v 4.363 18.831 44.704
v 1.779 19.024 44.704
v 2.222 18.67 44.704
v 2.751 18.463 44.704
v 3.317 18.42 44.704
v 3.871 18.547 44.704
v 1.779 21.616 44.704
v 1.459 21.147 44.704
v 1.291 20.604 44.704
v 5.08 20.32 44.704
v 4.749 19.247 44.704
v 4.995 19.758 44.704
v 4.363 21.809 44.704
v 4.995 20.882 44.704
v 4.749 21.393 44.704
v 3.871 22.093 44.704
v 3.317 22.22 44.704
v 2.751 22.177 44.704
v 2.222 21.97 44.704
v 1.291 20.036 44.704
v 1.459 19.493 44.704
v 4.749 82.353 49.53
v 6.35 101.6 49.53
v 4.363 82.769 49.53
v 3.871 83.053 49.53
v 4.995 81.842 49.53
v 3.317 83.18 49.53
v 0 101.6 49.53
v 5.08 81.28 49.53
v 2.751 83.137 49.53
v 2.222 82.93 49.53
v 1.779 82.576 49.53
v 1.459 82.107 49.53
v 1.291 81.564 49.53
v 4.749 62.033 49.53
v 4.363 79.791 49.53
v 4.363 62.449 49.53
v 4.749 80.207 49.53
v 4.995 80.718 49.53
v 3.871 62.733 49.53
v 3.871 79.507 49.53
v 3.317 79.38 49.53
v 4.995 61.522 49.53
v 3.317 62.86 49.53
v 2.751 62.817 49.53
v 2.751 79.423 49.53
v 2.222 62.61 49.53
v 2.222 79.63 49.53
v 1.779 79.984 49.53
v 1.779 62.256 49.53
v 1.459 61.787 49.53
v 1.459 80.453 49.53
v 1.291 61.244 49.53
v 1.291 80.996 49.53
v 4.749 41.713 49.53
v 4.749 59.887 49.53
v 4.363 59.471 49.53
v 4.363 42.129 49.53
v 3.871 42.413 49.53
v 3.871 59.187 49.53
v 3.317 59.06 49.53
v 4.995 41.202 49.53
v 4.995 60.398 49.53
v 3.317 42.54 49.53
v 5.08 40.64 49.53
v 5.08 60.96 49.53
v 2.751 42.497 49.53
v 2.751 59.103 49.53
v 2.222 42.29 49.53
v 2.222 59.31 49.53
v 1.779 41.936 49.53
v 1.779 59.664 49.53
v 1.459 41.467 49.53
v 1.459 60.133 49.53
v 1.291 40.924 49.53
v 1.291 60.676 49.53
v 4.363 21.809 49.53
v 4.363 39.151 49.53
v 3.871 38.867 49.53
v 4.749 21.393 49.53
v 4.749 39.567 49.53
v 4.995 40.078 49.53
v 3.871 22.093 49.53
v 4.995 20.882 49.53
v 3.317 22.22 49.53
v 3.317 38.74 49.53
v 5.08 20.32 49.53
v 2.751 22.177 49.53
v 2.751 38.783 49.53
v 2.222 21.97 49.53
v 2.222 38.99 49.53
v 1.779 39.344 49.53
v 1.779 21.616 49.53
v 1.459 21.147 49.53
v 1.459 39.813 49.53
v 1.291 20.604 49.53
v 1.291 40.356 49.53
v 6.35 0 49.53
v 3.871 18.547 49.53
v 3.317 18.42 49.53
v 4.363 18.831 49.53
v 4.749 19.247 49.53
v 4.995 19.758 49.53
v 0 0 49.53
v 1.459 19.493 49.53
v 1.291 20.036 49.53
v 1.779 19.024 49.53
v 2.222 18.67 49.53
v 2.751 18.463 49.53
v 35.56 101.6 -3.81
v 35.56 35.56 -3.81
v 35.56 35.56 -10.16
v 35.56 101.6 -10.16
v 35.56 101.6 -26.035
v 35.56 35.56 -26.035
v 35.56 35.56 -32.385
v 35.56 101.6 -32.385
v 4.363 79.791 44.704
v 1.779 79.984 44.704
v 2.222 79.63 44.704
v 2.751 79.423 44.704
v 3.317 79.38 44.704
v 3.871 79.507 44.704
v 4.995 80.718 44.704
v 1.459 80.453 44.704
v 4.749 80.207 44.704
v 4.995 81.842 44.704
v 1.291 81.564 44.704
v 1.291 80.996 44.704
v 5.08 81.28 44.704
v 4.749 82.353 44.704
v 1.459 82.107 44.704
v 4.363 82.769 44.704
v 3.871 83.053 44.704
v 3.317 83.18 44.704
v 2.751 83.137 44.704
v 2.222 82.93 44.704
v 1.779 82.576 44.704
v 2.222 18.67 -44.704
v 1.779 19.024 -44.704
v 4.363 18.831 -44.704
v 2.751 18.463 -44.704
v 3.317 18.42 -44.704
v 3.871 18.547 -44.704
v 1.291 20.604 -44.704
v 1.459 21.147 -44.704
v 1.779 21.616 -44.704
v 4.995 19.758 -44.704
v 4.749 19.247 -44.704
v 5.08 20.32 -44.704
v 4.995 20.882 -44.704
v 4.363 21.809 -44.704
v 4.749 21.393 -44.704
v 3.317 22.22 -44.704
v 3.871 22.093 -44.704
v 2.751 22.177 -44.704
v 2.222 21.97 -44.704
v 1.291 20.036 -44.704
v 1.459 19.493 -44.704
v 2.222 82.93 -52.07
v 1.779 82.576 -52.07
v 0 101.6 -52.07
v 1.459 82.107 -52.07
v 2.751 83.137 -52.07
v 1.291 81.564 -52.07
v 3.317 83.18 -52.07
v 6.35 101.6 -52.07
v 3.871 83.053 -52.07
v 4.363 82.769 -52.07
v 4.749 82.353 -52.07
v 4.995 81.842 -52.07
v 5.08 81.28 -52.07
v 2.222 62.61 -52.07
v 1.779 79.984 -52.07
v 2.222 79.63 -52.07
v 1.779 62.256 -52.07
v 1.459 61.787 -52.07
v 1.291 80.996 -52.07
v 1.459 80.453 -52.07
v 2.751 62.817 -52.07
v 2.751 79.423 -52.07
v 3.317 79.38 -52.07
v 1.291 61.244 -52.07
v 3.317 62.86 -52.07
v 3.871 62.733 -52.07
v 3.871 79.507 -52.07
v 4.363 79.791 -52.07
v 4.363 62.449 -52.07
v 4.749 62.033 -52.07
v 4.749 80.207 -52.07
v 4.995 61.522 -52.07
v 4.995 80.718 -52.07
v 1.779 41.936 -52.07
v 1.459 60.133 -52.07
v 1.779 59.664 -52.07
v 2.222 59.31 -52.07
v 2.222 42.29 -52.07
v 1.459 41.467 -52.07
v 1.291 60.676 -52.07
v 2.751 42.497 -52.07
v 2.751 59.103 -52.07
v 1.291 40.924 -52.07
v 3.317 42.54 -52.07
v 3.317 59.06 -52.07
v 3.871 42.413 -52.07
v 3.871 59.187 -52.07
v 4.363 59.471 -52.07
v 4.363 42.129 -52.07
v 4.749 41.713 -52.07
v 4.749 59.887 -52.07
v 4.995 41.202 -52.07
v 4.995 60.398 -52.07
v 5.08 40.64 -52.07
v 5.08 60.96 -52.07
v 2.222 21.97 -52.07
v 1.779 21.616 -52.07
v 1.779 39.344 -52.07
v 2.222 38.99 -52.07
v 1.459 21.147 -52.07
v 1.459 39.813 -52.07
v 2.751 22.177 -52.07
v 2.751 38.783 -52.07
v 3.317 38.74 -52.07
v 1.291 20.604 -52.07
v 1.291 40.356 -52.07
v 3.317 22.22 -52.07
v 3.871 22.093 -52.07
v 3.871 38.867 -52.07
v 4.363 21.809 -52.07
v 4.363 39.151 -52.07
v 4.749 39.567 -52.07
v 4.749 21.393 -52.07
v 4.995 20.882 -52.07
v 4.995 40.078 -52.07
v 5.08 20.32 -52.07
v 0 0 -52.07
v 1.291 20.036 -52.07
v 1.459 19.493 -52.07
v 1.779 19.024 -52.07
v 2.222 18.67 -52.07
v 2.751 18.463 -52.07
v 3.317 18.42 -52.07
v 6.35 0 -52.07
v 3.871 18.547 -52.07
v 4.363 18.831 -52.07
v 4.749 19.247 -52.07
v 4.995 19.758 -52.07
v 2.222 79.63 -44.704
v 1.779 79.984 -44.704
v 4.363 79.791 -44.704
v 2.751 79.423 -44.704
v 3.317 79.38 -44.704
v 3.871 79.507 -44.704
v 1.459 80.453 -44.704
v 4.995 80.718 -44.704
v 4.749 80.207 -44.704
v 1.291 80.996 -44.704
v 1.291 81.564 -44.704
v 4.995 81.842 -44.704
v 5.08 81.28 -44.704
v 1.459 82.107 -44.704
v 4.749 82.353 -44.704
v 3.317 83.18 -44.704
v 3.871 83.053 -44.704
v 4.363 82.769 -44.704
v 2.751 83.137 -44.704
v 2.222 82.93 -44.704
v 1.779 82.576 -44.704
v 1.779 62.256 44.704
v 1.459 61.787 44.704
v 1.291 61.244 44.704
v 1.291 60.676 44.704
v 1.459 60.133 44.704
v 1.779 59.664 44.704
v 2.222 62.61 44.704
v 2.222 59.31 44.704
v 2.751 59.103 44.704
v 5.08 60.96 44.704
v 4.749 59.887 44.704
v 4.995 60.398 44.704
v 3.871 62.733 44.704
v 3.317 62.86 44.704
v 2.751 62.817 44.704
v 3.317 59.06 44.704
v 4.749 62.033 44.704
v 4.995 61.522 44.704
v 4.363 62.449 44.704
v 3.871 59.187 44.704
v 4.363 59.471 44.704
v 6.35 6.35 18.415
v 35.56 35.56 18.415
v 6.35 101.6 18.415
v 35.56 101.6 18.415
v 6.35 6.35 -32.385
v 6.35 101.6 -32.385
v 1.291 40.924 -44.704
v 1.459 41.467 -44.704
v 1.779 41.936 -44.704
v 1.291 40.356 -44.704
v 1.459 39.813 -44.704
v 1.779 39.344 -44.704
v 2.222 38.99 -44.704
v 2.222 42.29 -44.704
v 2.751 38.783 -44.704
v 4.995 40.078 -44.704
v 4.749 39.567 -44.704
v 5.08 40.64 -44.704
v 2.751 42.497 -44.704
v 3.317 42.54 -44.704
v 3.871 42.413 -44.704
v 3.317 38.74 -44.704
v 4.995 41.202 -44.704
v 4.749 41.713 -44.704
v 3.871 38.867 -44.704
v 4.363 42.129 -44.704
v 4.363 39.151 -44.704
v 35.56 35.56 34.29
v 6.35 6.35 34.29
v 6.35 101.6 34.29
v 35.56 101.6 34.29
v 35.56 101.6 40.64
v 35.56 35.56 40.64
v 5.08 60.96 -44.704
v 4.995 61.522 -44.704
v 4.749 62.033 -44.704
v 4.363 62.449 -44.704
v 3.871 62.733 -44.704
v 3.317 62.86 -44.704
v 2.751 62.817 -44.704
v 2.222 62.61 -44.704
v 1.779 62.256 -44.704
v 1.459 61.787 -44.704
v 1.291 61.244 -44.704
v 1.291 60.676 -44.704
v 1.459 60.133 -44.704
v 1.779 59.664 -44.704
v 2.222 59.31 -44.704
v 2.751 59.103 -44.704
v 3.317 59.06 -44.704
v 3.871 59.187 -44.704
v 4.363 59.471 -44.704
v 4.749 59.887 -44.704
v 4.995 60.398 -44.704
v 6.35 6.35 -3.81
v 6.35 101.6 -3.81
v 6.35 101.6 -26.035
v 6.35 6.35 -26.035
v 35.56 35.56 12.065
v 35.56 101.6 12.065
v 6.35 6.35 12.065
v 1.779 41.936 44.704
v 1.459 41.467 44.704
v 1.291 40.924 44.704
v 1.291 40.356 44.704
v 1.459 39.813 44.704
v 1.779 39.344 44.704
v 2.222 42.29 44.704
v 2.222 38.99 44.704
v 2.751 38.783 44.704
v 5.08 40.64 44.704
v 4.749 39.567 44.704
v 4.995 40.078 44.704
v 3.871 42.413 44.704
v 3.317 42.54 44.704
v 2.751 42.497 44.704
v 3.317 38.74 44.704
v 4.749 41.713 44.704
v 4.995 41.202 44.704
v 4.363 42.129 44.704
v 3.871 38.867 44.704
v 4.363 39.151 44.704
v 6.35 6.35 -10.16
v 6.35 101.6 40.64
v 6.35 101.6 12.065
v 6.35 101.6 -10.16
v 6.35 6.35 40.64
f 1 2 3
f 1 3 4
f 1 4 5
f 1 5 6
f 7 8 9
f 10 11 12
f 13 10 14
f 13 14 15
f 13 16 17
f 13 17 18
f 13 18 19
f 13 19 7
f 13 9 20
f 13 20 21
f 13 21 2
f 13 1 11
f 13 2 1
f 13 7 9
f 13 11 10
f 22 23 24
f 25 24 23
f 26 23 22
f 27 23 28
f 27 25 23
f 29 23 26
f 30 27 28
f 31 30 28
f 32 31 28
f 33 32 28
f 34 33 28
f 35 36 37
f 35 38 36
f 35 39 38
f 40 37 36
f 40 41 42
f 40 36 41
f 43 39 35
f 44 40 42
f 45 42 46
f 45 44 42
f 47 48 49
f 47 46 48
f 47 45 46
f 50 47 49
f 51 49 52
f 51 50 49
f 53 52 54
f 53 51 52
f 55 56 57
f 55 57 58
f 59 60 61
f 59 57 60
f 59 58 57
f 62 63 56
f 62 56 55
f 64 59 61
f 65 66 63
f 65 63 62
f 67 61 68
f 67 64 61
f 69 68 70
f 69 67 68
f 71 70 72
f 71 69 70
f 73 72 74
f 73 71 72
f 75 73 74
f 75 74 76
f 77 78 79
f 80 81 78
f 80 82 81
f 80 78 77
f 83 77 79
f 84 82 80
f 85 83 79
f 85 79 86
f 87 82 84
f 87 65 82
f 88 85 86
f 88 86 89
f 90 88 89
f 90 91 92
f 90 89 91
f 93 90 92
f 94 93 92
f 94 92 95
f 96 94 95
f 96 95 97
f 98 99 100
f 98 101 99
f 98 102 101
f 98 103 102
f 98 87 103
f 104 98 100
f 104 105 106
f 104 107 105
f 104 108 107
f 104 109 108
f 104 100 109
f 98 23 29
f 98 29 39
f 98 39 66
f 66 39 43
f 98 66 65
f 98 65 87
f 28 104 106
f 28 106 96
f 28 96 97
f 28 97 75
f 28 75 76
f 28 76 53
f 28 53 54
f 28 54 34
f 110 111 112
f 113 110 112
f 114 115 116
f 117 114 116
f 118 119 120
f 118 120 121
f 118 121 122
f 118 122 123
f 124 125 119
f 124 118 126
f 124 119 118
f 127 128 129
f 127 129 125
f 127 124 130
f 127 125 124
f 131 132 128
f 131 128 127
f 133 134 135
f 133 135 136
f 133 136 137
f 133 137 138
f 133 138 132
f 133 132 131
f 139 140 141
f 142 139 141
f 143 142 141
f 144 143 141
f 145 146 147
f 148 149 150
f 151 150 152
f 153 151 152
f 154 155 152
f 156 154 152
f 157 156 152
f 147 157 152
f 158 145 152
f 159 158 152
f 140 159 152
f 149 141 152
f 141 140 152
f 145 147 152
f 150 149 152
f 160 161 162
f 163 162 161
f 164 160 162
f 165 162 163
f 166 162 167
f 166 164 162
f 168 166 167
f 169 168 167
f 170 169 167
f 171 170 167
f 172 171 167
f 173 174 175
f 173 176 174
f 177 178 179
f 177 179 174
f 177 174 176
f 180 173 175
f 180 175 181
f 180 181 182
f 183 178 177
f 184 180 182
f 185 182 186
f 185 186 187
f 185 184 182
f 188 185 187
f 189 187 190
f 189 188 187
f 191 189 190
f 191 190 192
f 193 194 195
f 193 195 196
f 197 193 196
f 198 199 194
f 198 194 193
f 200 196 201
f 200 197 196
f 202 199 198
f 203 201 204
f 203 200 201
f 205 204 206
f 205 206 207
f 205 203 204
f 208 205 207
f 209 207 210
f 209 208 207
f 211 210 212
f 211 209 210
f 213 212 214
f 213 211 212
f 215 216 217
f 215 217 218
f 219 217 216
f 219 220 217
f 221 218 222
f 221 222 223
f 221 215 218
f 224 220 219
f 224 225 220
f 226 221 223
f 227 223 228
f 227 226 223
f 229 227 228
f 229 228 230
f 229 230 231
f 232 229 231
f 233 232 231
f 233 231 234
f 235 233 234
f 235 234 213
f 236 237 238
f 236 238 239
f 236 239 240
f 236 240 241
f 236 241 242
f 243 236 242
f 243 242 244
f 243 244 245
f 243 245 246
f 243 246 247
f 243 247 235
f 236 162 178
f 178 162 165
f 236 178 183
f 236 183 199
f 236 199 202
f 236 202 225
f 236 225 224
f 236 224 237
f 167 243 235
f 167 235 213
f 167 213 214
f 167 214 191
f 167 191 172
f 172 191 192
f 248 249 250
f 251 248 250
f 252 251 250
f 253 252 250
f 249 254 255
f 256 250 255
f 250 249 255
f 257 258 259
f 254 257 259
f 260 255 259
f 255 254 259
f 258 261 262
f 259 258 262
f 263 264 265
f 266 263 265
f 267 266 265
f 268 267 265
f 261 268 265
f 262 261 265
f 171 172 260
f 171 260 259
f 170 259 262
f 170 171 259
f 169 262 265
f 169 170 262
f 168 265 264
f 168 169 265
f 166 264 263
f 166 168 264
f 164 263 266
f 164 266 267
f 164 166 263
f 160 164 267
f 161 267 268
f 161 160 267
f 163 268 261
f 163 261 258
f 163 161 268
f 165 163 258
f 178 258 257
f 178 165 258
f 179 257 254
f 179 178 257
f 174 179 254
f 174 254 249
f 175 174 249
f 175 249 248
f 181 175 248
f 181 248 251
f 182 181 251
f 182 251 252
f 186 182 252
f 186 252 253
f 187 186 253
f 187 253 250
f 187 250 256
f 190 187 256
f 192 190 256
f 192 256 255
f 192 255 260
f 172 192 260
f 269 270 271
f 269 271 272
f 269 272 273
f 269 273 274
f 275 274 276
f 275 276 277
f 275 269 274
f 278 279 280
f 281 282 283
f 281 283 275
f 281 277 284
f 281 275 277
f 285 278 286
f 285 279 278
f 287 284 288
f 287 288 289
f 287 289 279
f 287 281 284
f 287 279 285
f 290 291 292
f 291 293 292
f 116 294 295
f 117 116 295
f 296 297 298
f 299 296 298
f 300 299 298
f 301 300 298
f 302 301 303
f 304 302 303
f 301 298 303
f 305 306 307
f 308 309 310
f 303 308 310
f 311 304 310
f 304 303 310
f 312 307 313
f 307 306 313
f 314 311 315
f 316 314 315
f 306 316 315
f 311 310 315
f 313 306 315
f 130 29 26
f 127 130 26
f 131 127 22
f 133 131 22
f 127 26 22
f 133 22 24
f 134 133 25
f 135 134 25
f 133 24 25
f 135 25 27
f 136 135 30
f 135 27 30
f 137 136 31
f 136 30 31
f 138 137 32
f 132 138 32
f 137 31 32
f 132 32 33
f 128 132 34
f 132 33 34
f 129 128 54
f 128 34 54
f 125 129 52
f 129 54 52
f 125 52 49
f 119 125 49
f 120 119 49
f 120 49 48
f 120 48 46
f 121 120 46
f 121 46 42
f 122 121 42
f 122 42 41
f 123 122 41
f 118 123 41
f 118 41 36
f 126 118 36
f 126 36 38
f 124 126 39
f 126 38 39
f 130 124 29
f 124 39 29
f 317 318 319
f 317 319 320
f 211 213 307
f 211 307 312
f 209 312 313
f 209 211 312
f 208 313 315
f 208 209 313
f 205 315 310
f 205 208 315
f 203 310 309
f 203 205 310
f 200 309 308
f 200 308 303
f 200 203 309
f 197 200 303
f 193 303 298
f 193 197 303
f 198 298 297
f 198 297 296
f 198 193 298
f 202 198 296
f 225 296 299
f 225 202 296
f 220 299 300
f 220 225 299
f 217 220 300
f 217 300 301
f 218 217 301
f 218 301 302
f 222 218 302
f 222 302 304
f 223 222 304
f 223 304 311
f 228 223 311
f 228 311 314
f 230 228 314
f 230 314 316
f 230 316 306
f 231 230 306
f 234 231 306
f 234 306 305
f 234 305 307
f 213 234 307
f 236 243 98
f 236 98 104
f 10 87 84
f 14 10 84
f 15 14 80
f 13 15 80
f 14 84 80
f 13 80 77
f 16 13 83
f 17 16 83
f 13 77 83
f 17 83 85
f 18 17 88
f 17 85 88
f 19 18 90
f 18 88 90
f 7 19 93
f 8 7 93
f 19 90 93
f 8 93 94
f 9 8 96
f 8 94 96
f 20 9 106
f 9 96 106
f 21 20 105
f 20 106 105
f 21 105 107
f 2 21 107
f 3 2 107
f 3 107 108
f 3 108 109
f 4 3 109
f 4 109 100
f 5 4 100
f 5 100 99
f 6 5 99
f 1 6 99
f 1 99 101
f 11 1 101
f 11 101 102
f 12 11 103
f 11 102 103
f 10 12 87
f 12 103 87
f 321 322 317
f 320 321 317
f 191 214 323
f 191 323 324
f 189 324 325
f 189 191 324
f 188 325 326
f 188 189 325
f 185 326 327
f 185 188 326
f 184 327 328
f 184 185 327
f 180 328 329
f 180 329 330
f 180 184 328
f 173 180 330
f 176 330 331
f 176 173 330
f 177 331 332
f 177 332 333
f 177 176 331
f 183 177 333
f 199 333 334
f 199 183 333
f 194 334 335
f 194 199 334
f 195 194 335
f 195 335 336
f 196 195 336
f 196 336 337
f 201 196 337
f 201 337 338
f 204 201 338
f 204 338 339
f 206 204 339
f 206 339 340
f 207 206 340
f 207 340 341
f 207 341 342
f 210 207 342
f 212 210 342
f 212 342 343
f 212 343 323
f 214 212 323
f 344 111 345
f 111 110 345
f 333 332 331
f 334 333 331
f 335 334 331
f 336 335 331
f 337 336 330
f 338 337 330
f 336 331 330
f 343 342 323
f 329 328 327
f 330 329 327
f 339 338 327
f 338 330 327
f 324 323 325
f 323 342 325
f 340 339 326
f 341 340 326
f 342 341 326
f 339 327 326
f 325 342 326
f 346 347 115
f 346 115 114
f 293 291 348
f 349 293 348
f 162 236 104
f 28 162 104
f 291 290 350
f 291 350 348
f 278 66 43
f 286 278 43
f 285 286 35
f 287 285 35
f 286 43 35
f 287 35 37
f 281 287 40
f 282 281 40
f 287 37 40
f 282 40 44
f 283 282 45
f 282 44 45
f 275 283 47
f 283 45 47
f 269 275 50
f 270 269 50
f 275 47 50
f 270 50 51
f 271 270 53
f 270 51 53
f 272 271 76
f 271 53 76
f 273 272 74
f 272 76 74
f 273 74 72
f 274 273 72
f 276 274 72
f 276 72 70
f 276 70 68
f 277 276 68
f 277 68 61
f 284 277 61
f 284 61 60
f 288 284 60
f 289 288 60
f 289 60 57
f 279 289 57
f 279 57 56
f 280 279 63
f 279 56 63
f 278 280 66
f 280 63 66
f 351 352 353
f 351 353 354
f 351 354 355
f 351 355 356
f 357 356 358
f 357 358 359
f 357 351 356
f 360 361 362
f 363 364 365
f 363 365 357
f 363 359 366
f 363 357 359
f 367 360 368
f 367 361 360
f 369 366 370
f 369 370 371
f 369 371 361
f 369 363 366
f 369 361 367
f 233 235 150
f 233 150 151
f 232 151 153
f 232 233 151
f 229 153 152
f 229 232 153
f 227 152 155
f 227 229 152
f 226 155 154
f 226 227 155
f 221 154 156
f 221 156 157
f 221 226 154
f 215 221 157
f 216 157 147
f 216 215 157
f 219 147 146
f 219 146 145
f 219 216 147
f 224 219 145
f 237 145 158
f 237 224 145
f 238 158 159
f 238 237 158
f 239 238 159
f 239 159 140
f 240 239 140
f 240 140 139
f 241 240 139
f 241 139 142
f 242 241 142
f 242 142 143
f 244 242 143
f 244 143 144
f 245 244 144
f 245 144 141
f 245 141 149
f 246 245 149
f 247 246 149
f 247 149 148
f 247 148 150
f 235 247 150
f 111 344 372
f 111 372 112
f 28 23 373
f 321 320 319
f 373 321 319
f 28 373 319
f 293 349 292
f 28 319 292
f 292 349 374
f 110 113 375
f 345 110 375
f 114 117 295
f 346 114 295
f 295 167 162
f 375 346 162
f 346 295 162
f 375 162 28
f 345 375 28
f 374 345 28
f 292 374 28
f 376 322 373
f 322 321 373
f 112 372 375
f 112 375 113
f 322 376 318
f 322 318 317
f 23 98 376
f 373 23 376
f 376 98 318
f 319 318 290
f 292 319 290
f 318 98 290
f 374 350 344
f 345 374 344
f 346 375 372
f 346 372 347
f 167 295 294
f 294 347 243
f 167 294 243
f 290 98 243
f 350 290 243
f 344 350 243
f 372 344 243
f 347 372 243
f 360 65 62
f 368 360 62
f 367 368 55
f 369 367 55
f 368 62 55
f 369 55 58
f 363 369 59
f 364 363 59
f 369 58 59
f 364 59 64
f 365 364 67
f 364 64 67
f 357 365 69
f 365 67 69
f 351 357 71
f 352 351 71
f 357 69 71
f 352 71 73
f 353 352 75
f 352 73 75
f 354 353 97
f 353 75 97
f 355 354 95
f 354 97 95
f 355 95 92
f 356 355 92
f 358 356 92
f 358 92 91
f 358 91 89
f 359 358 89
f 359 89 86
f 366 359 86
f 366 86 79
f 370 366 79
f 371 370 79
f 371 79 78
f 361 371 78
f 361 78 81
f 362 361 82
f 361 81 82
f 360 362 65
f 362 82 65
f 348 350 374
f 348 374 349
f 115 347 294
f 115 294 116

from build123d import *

# Parameters (mm, degrees)
BOSS_EXTRUDE1_DEPTH = 101.6
SKETCH2_R           = 1.905
CUT_EXTRUDE1_DEPTH  = 4.826
SKETCH5_W           = 29.21
SKETCH5_H           = 6.35
BOSS_EXTRUDE2_DEPTH = 57.15
CHAMFER1_SIZE       = 38.1
CUT_EXTRUDE2_START  = -101.6
SKETCH2_2_R         = 1.905
CUT_EXTRUDE2_DEPTH  = 4.826


with BuildPart() as part:
    # Sketch1 → Boss-Extrude1 (new body)
    with BuildSketch(Plane(origin=(0, 0, 0), x_dir=(1, 0, 0), z_dir=(0, 1, 0))):
        Polygon((0, -19.05), (0, 19.05), (0, 52.07), (6.35, 52.07), (6.35, 19.05), (6.35, -19.05), (6.35, -49.53), (0, -49.53), align=None)
    extrude(amount=BOSS_EXTRUDE1_DEPTH)

    # Sketch2 → Cut-Extrude1 (cut)
    with BuildSketch(Plane.XY.offset(49.53)):
        with Locations((3.175, 81.28)):
            Circle(SKETCH2_R)
        with Locations((3.175, 60.96)):
            Circle(SKETCH2_R)
        with Locations((3.175, 20.32)):
            Circle(SKETCH2_R)
        with Locations((3.175, 40.64)):
            Circle(SKETCH2_R)
    cut_extrude1 = extrude(amount=-CUT_EXTRUDE1_DEPTH, mode=Mode.SUBTRACT)

    # Mirror1: Cut-Extrude1 across plane
    add(cut_extrude1.mirror(Plane.XY), mode=Mode.SUBTRACT)

    # Sketch5 → Boss-Extrude2 (add)
    with BuildSketch(Plane(origin=(0, 101.6, 0), x_dir=(1, 0, 0), z_dir=(0, 1, 0))):
        with Locations((20.955, 29.21)):
            Rectangle(SKETCH5_W, SKETCH5_H)
        with Locations((20.955, 6.985)):
            Rectangle(SKETCH5_W, SKETCH5_H)
        with Locations((20.955, -15.24)):
            Rectangle(SKETCH5_W, SKETCH5_H)
        with Locations((20.955, -37.465)):
            Rectangle(SKETCH5_W, SKETCH5_H)
    extrude(amount=-BOSS_EXTRUDE2_DEPTH)

    # Chamfer1
    # the kernel refuses this chamfer: 38.1 mm, written as the material it adds along each edge
    with BuildSketch(Plane(origin=(6.35, 44.45, 71.946121842), x_dir=(-0.02749587661058638, -0.9996219169112968, 0), z_dir=(0, 0, -1))) as chamfer1_piece_1_section:
        Polygon((CHAMFER1_SIZE * 0.999621916911, -CHAMFER1_SIZE * 0.0274958766106), (-CHAMFER1_SIZE * 0.0274958766106, -CHAMFER1_SIZE * 0.999621916911), (0, 0), align=None)
    chamfer1_piece_1 = extrude(amount=104.331121842, mode=Mode.PRIVATE)
    chamfer1_piece_1 = split(chamfer1_piece_1, bisect_by=Plane(origin=(17.461394365, 31.123016765, 40.64), z_dir=(0, 0, -1)), keep=Keep.TOP, mode=Mode.PRIVATE)
    chamfer1_piece_1 = split(chamfer1_piece_1, bisect_by=Plane(origin=(17.461394365, 31.123016765, 34.29), z_dir=(0, 0, 1)), keep=Keep.TOP, mode=Mode.PRIVATE)
    chamfer1_piece_1 = split(chamfer1_piece_1, bisect_by=Plane(origin=(35.56, 31.123016765, 37.465), z_dir=(-1, 0, 0)), keep=Keep.TOP, mode=Mode.PRIVATE)
    add(chamfer1_piece_1)
    with BuildSketch(Plane(origin=(6.35, 44.45, 71.946121842), x_dir=(-0.02749587661058638, -0.9996219169112968, 0), z_dir=(0, 0, -1))) as chamfer1_piece_2_section:
        Polygon((CHAMFER1_SIZE * 0.999621916911, -CHAMFER1_SIZE * 0.0274958766106), (-CHAMFER1_SIZE * 0.0274958766106, -CHAMFER1_SIZE * 0.999621916911), (0, 0), align=None)
    chamfer1_piece_2 = extrude(amount=104.331121842, mode=Mode.PRIVATE)
    chamfer1_piece_2 = split(chamfer1_piece_2, bisect_by=Plane(origin=(35.56, 31.123016765, 15.24), z_dir=(-1, 0, 0)), keep=Keep.TOP, mode=Mode.PRIVATE)
    chamfer1_piece_2 = split(chamfer1_piece_2, bisect_by=Plane(origin=(17.461394365, 31.123016765, 18.415), z_dir=(0, 0, -1)), keep=Keep.TOP, mode=Mode.PRIVATE)
    chamfer1_piece_2 = split(chamfer1_piece_2, bisect_by=Plane(origin=(17.461394365, 31.123016765, 12.065), z_dir=(0, 0, 1)), keep=Keep.TOP, mode=Mode.PRIVATE)
    add(chamfer1_piece_2)
    with BuildSketch(Plane(origin=(6.35, 44.45, 71.946121842), x_dir=(-0.02749587661058638, -0.9996219169112968, 0), z_dir=(0, 0, -1))) as chamfer1_piece_3_section:
        Polygon((CHAMFER1_SIZE * 0.999621916911, -CHAMFER1_SIZE * 0.0274958766106), (-CHAMFER1_SIZE * 0.0274958766106, -CHAMFER1_SIZE * 0.999621916911), (0, 0), align=None)
    chamfer1_piece_3 = extrude(amount=104.331121842, mode=Mode.PRIVATE)
    chamfer1_piece_3 = split(chamfer1_piece_3, bisect_by=Plane(origin=(35.56, 31.123016765, -6.985), z_dir=(-1, 0, 0)), keep=Keep.TOP, mode=Mode.PRIVATE)
    chamfer1_piece_3 = split(chamfer1_piece_3, bisect_by=Plane(origin=(17.461394365, 31.123016765, -3.81), z_dir=(0, 0, -1)), keep=Keep.TOP, mode=Mode.PRIVATE)
    chamfer1_piece_3 = split(chamfer1_piece_3, bisect_by=Plane(origin=(17.461394365, 31.123016765, -10.16), z_dir=(0, 0, 1)), keep=Keep.TOP, mode=Mode.PRIVATE)
    add(chamfer1_piece_3)
    with BuildSketch(Plane(origin=(6.35, 44.45, -26.035), x_dir=(-0.027495876610586018, -0.9996219169112968, 0), z_dir=(0, 0, -1))) as chamfer1_piece_4_section:
        Polygon((CHAMFER1_SIZE * 0.999621916911, -CHAMFER1_SIZE * 0.0274958766106), (-CHAMFER1_SIZE * 0.0274958766106, -CHAMFER1_SIZE * 0.999621916911), (0, 0), align=None)
    chamfer1_piece_4 = extrude(amount=6.35, mode=Mode.PRIVATE)
    chamfer1_piece_4 = split(chamfer1_piece_4, bisect_by=Plane(origin=(35.56, 31.123016765, -29.21), z_dir=(-1, 0, 0)), keep=Keep.TOP, mode=Mode.PRIVATE)
    add(chamfer1_piece_4)
    with BuildSketch(Plane(origin=(6.35, 44.45, 94.171121842), x_dir=(-0.02749587661058638, -0.9996219169112968, 0), z_dir=(0, 0, -1))) as chamfer1_piece_5_section:
        Polygon((CHAMFER1_SIZE * 0.999621916911, -CHAMFER1_SIZE * 0.0274958766106), (-CHAMFER1_SIZE * 0.0274958766106, -CHAMFER1_SIZE * 0.999621916911), (0, 0), align=None)
    chamfer1_piece_5 = extrude(amount=104.331121842, mode=Mode.PRIVATE)
    chamfer1_piece_5 = split(chamfer1_piece_5, bisect_by=Plane(origin=(17.461394365, 31.123016765, 40.64), z_dir=(0, 0, -1)), keep=Keep.TOP, mode=Mode.PRIVATE)
    chamfer1_piece_5 = split(chamfer1_piece_5, bisect_by=Plane(origin=(17.461394365, 31.123016765, 34.29), z_dir=(0, 0, 1)), keep=Keep.TOP, mode=Mode.PRIVATE)
    chamfer1_piece_5 = split(chamfer1_piece_5, bisect_by=Plane(origin=(35.56, 31.123016765, 37.465), z_dir=(-1, 0, 0)), keep=Keep.TOP, mode=Mode.PRIVATE)
    add(chamfer1_piece_5)
    with BuildSketch(Plane(origin=(6.35, 44.45, 94.171121842), x_dir=(-0.02749587661058638, -0.9996219169112968, 0), z_dir=(0, 0, -1))) as chamfer1_piece_6_section:
        Polygon((CHAMFER1_SIZE * 0.999621916911, -CHAMFER1_SIZE * 0.0274958766106), (-CHAMFER1_SIZE * 0.0274958766106, -CHAMFER1_SIZE * 0.999621916911), (0, 0), align=None)
    chamfer1_piece_6 = extrude(amount=104.331121842, mode=Mode.PRIVATE)
    chamfer1_piece_6 = split(chamfer1_piece_6, bisect_by=Plane(origin=(35.56, 31.123016765, 15.24), z_dir=(-1, 0, 0)), keep=Keep.TOP, mode=Mode.PRIVATE)
    chamfer1_piece_6 = split(chamfer1_piece_6, bisect_by=Plane(origin=(17.461394365, 31.123016765, 18.415), z_dir=(0, 0, -1)), keep=Keep.TOP, mode=Mode.PRIVATE)
    chamfer1_piece_6 = split(chamfer1_piece_6, bisect_by=Plane(origin=(17.461394365, 31.123016765, 12.065), z_dir=(0, 0, 1)), keep=Keep.TOP, mode=Mode.PRIVATE)
    add(chamfer1_piece_6)
    with BuildSketch(Plane(origin=(6.35, 44.45, -3.81), x_dir=(-0.027495876610585814, -0.9996219169112968, 0), z_dir=(0, 0, -1))) as chamfer1_piece_7_section:
        Polygon((CHAMFER1_SIZE * 0.999621916911, -CHAMFER1_SIZE * 0.0274958766106), (-CHAMFER1_SIZE * 0.0274958766106, -CHAMFER1_SIZE * 0.999621916911), (0, 0), align=None)
    chamfer1_piece_7 = extrude(amount=6.35, mode=Mode.PRIVATE)
    chamfer1_piece_7 = split(chamfer1_piece_7, bisect_by=Plane(origin=(35.56, 31.123016765, -6.985), z_dir=(-1, 0, 0)), keep=Keep.TOP, mode=Mode.PRIVATE)
    add(chamfer1_piece_7)
    with BuildSketch(Plane(origin=(6.35, 44.45, -3.81), x_dir=(-0.027495876610585814, -0.9996219169112968, 0), z_dir=(0, 0, -1))) as chamfer1_piece_8_section:
        Polygon((CHAMFER1_SIZE * 0.999621916911, -CHAMFER1_SIZE * 0.0274958766106), (-CHAMFER1_SIZE * 0.0274958766106, -CHAMFER1_SIZE * 0.999621916911), (0, 0), align=None)
    chamfer1_piece_8 = extrude(amount=104.331121842, mode=Mode.PRIVATE)
    chamfer1_piece_8 = split(chamfer1_piece_8, bisect_by=Plane(origin=(35.56, 31.123016765, -29.21), z_dir=(-1, 0, 0)), keep=Keep.TOP, mode=Mode.PRIVATE)
    chamfer1_piece_8 = split(chamfer1_piece_8, bisect_by=Plane(origin=(17.461394365, 31.123016765, -26.035), z_dir=(0, 0, -1)), keep=Keep.TOP, mode=Mode.PRIVATE)
    chamfer1_piece_8 = split(chamfer1_piece_8, bisect_by=Plane(origin=(17.461394365, 31.123016765, -32.385), z_dir=(0, 0, 1)), keep=Keep.TOP, mode=Mode.PRIVATE)
    add(chamfer1_piece_8)
    with BuildSketch(Plane(origin=(6.35, 44.45, 116.396121842), x_dir=(-0.02749587661058638, -0.9996219169112968, 0), z_dir=(0, 0, -1))) as chamfer1_piece_9_section:
        Polygon((CHAMFER1_SIZE * 0.999621916911, -CHAMFER1_SIZE * 0.0274958766106), (-CHAMFER1_SIZE * 0.0274958766106, -CHAMFER1_SIZE * 0.999621916911), (0, 0), align=None)
    chamfer1_piece_9 = extrude(amount=104.331121842, mode=Mode.PRIVATE)
    chamfer1_piece_9 = split(chamfer1_piece_9, bisect_by=Plane(origin=(17.461394365, 31.123016765, 40.64), z_dir=(0, 0, -1)), keep=Keep.TOP, mode=Mode.PRIVATE)
    chamfer1_piece_9 = split(chamfer1_piece_9, bisect_by=Plane(origin=(17.461394365, 31.123016765, 34.29), z_dir=(0, 0, 1)), keep=Keep.TOP, mode=Mode.PRIVATE)
    chamfer1_piece_9 = split(chamfer1_piece_9, bisect_by=Plane(origin=(35.56, 31.123016765, 37.465), z_dir=(-1, 0, 0)), keep=Keep.TOP, mode=Mode.PRIVATE)
    add(chamfer1_piece_9)
    with BuildSketch(Plane(origin=(6.35, 44.45, 18.415), x_dir=(-0.02749587661058561, -0.9996219169112968, 0), z_dir=(0, 0, -1))) as chamfer1_piece_10_section:
        Polygon((CHAMFER1_SIZE * 0.999621916911, -CHAMFER1_SIZE * 0.0274958766106), (-CHAMFER1_SIZE * 0.0274958766106, -CHAMFER1_SIZE * 0.999621916911), (0, 0), align=None)
    chamfer1_piece_10 = extrude(amount=6.35, mode=Mode.PRIVATE)
    chamfer1_piece_10 = split(chamfer1_piece_10, bisect_by=Plane(origin=(35.56, 31.123016765, 15.24), z_dir=(-1, 0, 0)), keep=Keep.TOP, mode=Mode.PRIVATE)
    add(chamfer1_piece_10)
    with BuildSketch(Plane(origin=(6.35, 44.45, 18.415), x_dir=(-0.02749587661058561, -0.9996219169112968, 0), z_dir=(0, 0, -1))) as chamfer1_piece_11_section:
        Polygon((CHAMFER1_SIZE * 0.999621916911, -CHAMFER1_SIZE * 0.0274958766106), (-CHAMFER1_SIZE * 0.0274958766106, -CHAMFER1_SIZE * 0.999621916911), (0, 0), align=None)
    chamfer1_piece_11 = extrude(amount=104.331121842, mode=Mode.PRIVATE)
    chamfer1_piece_11 = split(chamfer1_piece_11, bisect_by=Plane(origin=(35.56, 31.123016765, -6.985), z_dir=(-1, 0, 0)), keep=Keep.TOP, mode=Mode.PRIVATE)
    chamfer1_piece_11 = split(chamfer1_piece_11, bisect_by=Plane(origin=(17.461394365, 31.123016765, -3.81), z_dir=(0, 0, -1)), keep=Keep.TOP, mode=Mode.PRIVATE)
    chamfer1_piece_11 = split(chamfer1_piece_11, bisect_by=Plane(origin=(17.461394365, 31.123016765, -10.16), z_dir=(0, 0, 1)), keep=Keep.TOP, mode=Mode.PRIVATE)
    add(chamfer1_piece_11)
    with BuildSketch(Plane(origin=(6.35, 44.45, 18.415), x_dir=(-0.02749587661058561, -0.9996219169112968, 0), z_dir=(0, 0, -1))) as chamfer1_piece_12_section:
        Polygon((CHAMFER1_SIZE * 0.999621916911, -CHAMFER1_SIZE * 0.0274958766106), (-CHAMFER1_SIZE * 0.0274958766106, -CHAMFER1_SIZE * 0.999621916911), (0, 0), align=None)
    chamfer1_piece_12 = extrude(amount=104.331121842, mode=Mode.PRIVATE)
    chamfer1_piece_12 = split(chamfer1_piece_12, bisect_by=Plane(origin=(35.56, 31.123016765, -29.21), z_dir=(-1, 0, 0)), keep=Keep.TOP, mode=Mode.PRIVATE)
    chamfer1_piece_12 = split(chamfer1_piece_12, bisect_by=Plane(origin=(17.461394365, 31.123016765, -26.035), z_dir=(0, 0, -1)), keep=Keep.TOP, mode=Mode.PRIVATE)
    chamfer1_piece_12 = split(chamfer1_piece_12, bisect_by=Plane(origin=(17.461394365, 31.123016765, -32.385), z_dir=(0, 0, 1)), keep=Keep.TOP, mode=Mode.PRIVATE)
    add(chamfer1_piece_12)
    with BuildSketch(Plane(origin=(6.35, 44.45, 40.64), x_dir=(-0.02749587661058536, -0.9996219169112968, 0), z_dir=(0, 0, -1))) as chamfer1_piece_13_section:
        Polygon((CHAMFER1_SIZE * 0.999621916911, -CHAMFER1_SIZE * 0.0274958766106), (-CHAMFER1_SIZE * 0.0274958766106, -CHAMFER1_SIZE * 0.999621916911), (0, 0), align=None)
    chamfer1_piece_13 = extrude(amount=6.35, mode=Mode.PRIVATE)
    chamfer1_piece_13 = split(chamfer1_piece_13, bisect_by=Plane(origin=(35.56, 31.123016765, 37.465), z_dir=(-1, 0, 0)), keep=Keep.TOP, mode=Mode.PRIVATE)
    add(chamfer1_piece_13)
    with BuildSketch(Plane(origin=(6.35, 44.45, 40.64), x_dir=(-0.02749587661058536, -0.9996219169112968, 0), z_dir=(0, 0, -1))) as chamfer1_piece_14_section:
        Polygon((CHAMFER1_SIZE * 0.999621916911, -CHAMFER1_SIZE * 0.0274958766106), (-CHAMFER1_SIZE * 0.0274958766106, -CHAMFER1_SIZE * 0.999621916911), (0, 0), align=None)
    chamfer1_piece_14 = extrude(amount=104.331121842, mode=Mode.PRIVATE)
    chamfer1_piece_14 = split(chamfer1_piece_14, bisect_by=Plane(origin=(35.56, 31.123016765, 15.24), z_dir=(-1, 0, 0)), keep=Keep.TOP, mode=Mode.PRIVATE)
    chamfer1_piece_14 = split(chamfer1_piece_14, bisect_by=Plane(origin=(17.461394365, 31.123016765, 18.415), z_dir=(0, 0, -1)), keep=Keep.TOP, mode=Mode.PRIVATE)
    chamfer1_piece_14 = split(chamfer1_piece_14, bisect_by=Plane(origin=(17.461394365, 31.123016765, 12.065), z_dir=(0, 0, 1)), keep=Keep.TOP, mode=Mode.PRIVATE)
    add(chamfer1_piece_14)
    with BuildSketch(Plane(origin=(6.35, 44.45, 40.64), x_dir=(-0.02749587661058536, -0.9996219169112968, 0), z_dir=(0, 0, -1))) as chamfer1_piece_15_section:
        Polygon((CHAMFER1_SIZE * 0.999621916911, -CHAMFER1_SIZE * 0.0274958766106), (-CHAMFER1_SIZE * 0.0274958766106, -CHAMFER1_SIZE * 0.999621916911), (0, 0), align=None)
    chamfer1_piece_15 = extrude(amount=104.331121842, mode=Mode.PRIVATE)
    chamfer1_piece_15 = split(chamfer1_piece_15, bisect_by=Plane(origin=(35.56, 31.123016765, -6.985), z_dir=(-1, 0, 0)), keep=Keep.TOP, mode=Mode.PRIVATE)
    chamfer1_piece_15 = split(chamfer1_piece_15, bisect_by=Plane(origin=(17.461394365, 31.123016765, -3.81), z_dir=(0, 0, -1)), keep=Keep.TOP, mode=Mode.PRIVATE)
    chamfer1_piece_15 = split(chamfer1_piece_15, bisect_by=Plane(origin=(17.461394365, 31.123016765, -10.16), z_dir=(0, 0, 1)), keep=Keep.TOP, mode=Mode.PRIVATE)
    add(chamfer1_piece_15)
    with BuildSketch(Plane(origin=(6.35, 44.45, 40.64), x_dir=(-0.02749587661058536, -0.9996219169112968, 0), z_dir=(0, 0, -1))) as chamfer1_piece_16_section:
        Polygon((CHAMFER1_SIZE * 0.999621916911, -CHAMFER1_SIZE * 0.0274958766106), (-CHAMFER1_SIZE * 0.0274958766106, -CHAMFER1_SIZE * 0.999621916911), (0, 0), align=None)
    chamfer1_piece_16 = extrude(amount=104.331121842, mode=Mode.PRIVATE)
    chamfer1_piece_16 = split(chamfer1_piece_16, bisect_by=Plane(origin=(35.56, 31.123016765, -29.21), z_dir=(-1, 0, 0)), keep=Keep.TOP, mode=Mode.PRIVATE)
    chamfer1_piece_16 = split(chamfer1_piece_16, bisect_by=Plane(origin=(17.461394365, 31.123016765, -26.035), z_dir=(0, 0, -1)), keep=Keep.TOP, mode=Mode.PRIVATE)
    chamfer1_piece_16 = split(chamfer1_piece_16, bisect_by=Plane(origin=(17.461394365, 31.123016765, -32.385), z_dir=(0, 0, 1)), keep=Keep.TOP, mode=Mode.PRIVATE)
    add(chamfer1_piece_16)

    # Sketch2<2> → Cut-Extrude2 (cut)
    with BuildSketch(Plane.XY.offset(49.53).offset(CUT_EXTRUDE2_START)):
        with Locations((3.175, 81.28)):
            Circle(SKETCH2_2_R)
        with Locations((3.175, 60.96)):
            Circle(SKETCH2_2_R)
        with Locations((3.175, 20.32)):
            Circle(SKETCH2_2_R)
        with Locations((3.175, 40.64)):
            Circle(SKETCH2_2_R)
    extrude(amount=CUT_EXTRUDE2_DEPTH, mode=Mode.SUBTRACT)


solid = part.part
